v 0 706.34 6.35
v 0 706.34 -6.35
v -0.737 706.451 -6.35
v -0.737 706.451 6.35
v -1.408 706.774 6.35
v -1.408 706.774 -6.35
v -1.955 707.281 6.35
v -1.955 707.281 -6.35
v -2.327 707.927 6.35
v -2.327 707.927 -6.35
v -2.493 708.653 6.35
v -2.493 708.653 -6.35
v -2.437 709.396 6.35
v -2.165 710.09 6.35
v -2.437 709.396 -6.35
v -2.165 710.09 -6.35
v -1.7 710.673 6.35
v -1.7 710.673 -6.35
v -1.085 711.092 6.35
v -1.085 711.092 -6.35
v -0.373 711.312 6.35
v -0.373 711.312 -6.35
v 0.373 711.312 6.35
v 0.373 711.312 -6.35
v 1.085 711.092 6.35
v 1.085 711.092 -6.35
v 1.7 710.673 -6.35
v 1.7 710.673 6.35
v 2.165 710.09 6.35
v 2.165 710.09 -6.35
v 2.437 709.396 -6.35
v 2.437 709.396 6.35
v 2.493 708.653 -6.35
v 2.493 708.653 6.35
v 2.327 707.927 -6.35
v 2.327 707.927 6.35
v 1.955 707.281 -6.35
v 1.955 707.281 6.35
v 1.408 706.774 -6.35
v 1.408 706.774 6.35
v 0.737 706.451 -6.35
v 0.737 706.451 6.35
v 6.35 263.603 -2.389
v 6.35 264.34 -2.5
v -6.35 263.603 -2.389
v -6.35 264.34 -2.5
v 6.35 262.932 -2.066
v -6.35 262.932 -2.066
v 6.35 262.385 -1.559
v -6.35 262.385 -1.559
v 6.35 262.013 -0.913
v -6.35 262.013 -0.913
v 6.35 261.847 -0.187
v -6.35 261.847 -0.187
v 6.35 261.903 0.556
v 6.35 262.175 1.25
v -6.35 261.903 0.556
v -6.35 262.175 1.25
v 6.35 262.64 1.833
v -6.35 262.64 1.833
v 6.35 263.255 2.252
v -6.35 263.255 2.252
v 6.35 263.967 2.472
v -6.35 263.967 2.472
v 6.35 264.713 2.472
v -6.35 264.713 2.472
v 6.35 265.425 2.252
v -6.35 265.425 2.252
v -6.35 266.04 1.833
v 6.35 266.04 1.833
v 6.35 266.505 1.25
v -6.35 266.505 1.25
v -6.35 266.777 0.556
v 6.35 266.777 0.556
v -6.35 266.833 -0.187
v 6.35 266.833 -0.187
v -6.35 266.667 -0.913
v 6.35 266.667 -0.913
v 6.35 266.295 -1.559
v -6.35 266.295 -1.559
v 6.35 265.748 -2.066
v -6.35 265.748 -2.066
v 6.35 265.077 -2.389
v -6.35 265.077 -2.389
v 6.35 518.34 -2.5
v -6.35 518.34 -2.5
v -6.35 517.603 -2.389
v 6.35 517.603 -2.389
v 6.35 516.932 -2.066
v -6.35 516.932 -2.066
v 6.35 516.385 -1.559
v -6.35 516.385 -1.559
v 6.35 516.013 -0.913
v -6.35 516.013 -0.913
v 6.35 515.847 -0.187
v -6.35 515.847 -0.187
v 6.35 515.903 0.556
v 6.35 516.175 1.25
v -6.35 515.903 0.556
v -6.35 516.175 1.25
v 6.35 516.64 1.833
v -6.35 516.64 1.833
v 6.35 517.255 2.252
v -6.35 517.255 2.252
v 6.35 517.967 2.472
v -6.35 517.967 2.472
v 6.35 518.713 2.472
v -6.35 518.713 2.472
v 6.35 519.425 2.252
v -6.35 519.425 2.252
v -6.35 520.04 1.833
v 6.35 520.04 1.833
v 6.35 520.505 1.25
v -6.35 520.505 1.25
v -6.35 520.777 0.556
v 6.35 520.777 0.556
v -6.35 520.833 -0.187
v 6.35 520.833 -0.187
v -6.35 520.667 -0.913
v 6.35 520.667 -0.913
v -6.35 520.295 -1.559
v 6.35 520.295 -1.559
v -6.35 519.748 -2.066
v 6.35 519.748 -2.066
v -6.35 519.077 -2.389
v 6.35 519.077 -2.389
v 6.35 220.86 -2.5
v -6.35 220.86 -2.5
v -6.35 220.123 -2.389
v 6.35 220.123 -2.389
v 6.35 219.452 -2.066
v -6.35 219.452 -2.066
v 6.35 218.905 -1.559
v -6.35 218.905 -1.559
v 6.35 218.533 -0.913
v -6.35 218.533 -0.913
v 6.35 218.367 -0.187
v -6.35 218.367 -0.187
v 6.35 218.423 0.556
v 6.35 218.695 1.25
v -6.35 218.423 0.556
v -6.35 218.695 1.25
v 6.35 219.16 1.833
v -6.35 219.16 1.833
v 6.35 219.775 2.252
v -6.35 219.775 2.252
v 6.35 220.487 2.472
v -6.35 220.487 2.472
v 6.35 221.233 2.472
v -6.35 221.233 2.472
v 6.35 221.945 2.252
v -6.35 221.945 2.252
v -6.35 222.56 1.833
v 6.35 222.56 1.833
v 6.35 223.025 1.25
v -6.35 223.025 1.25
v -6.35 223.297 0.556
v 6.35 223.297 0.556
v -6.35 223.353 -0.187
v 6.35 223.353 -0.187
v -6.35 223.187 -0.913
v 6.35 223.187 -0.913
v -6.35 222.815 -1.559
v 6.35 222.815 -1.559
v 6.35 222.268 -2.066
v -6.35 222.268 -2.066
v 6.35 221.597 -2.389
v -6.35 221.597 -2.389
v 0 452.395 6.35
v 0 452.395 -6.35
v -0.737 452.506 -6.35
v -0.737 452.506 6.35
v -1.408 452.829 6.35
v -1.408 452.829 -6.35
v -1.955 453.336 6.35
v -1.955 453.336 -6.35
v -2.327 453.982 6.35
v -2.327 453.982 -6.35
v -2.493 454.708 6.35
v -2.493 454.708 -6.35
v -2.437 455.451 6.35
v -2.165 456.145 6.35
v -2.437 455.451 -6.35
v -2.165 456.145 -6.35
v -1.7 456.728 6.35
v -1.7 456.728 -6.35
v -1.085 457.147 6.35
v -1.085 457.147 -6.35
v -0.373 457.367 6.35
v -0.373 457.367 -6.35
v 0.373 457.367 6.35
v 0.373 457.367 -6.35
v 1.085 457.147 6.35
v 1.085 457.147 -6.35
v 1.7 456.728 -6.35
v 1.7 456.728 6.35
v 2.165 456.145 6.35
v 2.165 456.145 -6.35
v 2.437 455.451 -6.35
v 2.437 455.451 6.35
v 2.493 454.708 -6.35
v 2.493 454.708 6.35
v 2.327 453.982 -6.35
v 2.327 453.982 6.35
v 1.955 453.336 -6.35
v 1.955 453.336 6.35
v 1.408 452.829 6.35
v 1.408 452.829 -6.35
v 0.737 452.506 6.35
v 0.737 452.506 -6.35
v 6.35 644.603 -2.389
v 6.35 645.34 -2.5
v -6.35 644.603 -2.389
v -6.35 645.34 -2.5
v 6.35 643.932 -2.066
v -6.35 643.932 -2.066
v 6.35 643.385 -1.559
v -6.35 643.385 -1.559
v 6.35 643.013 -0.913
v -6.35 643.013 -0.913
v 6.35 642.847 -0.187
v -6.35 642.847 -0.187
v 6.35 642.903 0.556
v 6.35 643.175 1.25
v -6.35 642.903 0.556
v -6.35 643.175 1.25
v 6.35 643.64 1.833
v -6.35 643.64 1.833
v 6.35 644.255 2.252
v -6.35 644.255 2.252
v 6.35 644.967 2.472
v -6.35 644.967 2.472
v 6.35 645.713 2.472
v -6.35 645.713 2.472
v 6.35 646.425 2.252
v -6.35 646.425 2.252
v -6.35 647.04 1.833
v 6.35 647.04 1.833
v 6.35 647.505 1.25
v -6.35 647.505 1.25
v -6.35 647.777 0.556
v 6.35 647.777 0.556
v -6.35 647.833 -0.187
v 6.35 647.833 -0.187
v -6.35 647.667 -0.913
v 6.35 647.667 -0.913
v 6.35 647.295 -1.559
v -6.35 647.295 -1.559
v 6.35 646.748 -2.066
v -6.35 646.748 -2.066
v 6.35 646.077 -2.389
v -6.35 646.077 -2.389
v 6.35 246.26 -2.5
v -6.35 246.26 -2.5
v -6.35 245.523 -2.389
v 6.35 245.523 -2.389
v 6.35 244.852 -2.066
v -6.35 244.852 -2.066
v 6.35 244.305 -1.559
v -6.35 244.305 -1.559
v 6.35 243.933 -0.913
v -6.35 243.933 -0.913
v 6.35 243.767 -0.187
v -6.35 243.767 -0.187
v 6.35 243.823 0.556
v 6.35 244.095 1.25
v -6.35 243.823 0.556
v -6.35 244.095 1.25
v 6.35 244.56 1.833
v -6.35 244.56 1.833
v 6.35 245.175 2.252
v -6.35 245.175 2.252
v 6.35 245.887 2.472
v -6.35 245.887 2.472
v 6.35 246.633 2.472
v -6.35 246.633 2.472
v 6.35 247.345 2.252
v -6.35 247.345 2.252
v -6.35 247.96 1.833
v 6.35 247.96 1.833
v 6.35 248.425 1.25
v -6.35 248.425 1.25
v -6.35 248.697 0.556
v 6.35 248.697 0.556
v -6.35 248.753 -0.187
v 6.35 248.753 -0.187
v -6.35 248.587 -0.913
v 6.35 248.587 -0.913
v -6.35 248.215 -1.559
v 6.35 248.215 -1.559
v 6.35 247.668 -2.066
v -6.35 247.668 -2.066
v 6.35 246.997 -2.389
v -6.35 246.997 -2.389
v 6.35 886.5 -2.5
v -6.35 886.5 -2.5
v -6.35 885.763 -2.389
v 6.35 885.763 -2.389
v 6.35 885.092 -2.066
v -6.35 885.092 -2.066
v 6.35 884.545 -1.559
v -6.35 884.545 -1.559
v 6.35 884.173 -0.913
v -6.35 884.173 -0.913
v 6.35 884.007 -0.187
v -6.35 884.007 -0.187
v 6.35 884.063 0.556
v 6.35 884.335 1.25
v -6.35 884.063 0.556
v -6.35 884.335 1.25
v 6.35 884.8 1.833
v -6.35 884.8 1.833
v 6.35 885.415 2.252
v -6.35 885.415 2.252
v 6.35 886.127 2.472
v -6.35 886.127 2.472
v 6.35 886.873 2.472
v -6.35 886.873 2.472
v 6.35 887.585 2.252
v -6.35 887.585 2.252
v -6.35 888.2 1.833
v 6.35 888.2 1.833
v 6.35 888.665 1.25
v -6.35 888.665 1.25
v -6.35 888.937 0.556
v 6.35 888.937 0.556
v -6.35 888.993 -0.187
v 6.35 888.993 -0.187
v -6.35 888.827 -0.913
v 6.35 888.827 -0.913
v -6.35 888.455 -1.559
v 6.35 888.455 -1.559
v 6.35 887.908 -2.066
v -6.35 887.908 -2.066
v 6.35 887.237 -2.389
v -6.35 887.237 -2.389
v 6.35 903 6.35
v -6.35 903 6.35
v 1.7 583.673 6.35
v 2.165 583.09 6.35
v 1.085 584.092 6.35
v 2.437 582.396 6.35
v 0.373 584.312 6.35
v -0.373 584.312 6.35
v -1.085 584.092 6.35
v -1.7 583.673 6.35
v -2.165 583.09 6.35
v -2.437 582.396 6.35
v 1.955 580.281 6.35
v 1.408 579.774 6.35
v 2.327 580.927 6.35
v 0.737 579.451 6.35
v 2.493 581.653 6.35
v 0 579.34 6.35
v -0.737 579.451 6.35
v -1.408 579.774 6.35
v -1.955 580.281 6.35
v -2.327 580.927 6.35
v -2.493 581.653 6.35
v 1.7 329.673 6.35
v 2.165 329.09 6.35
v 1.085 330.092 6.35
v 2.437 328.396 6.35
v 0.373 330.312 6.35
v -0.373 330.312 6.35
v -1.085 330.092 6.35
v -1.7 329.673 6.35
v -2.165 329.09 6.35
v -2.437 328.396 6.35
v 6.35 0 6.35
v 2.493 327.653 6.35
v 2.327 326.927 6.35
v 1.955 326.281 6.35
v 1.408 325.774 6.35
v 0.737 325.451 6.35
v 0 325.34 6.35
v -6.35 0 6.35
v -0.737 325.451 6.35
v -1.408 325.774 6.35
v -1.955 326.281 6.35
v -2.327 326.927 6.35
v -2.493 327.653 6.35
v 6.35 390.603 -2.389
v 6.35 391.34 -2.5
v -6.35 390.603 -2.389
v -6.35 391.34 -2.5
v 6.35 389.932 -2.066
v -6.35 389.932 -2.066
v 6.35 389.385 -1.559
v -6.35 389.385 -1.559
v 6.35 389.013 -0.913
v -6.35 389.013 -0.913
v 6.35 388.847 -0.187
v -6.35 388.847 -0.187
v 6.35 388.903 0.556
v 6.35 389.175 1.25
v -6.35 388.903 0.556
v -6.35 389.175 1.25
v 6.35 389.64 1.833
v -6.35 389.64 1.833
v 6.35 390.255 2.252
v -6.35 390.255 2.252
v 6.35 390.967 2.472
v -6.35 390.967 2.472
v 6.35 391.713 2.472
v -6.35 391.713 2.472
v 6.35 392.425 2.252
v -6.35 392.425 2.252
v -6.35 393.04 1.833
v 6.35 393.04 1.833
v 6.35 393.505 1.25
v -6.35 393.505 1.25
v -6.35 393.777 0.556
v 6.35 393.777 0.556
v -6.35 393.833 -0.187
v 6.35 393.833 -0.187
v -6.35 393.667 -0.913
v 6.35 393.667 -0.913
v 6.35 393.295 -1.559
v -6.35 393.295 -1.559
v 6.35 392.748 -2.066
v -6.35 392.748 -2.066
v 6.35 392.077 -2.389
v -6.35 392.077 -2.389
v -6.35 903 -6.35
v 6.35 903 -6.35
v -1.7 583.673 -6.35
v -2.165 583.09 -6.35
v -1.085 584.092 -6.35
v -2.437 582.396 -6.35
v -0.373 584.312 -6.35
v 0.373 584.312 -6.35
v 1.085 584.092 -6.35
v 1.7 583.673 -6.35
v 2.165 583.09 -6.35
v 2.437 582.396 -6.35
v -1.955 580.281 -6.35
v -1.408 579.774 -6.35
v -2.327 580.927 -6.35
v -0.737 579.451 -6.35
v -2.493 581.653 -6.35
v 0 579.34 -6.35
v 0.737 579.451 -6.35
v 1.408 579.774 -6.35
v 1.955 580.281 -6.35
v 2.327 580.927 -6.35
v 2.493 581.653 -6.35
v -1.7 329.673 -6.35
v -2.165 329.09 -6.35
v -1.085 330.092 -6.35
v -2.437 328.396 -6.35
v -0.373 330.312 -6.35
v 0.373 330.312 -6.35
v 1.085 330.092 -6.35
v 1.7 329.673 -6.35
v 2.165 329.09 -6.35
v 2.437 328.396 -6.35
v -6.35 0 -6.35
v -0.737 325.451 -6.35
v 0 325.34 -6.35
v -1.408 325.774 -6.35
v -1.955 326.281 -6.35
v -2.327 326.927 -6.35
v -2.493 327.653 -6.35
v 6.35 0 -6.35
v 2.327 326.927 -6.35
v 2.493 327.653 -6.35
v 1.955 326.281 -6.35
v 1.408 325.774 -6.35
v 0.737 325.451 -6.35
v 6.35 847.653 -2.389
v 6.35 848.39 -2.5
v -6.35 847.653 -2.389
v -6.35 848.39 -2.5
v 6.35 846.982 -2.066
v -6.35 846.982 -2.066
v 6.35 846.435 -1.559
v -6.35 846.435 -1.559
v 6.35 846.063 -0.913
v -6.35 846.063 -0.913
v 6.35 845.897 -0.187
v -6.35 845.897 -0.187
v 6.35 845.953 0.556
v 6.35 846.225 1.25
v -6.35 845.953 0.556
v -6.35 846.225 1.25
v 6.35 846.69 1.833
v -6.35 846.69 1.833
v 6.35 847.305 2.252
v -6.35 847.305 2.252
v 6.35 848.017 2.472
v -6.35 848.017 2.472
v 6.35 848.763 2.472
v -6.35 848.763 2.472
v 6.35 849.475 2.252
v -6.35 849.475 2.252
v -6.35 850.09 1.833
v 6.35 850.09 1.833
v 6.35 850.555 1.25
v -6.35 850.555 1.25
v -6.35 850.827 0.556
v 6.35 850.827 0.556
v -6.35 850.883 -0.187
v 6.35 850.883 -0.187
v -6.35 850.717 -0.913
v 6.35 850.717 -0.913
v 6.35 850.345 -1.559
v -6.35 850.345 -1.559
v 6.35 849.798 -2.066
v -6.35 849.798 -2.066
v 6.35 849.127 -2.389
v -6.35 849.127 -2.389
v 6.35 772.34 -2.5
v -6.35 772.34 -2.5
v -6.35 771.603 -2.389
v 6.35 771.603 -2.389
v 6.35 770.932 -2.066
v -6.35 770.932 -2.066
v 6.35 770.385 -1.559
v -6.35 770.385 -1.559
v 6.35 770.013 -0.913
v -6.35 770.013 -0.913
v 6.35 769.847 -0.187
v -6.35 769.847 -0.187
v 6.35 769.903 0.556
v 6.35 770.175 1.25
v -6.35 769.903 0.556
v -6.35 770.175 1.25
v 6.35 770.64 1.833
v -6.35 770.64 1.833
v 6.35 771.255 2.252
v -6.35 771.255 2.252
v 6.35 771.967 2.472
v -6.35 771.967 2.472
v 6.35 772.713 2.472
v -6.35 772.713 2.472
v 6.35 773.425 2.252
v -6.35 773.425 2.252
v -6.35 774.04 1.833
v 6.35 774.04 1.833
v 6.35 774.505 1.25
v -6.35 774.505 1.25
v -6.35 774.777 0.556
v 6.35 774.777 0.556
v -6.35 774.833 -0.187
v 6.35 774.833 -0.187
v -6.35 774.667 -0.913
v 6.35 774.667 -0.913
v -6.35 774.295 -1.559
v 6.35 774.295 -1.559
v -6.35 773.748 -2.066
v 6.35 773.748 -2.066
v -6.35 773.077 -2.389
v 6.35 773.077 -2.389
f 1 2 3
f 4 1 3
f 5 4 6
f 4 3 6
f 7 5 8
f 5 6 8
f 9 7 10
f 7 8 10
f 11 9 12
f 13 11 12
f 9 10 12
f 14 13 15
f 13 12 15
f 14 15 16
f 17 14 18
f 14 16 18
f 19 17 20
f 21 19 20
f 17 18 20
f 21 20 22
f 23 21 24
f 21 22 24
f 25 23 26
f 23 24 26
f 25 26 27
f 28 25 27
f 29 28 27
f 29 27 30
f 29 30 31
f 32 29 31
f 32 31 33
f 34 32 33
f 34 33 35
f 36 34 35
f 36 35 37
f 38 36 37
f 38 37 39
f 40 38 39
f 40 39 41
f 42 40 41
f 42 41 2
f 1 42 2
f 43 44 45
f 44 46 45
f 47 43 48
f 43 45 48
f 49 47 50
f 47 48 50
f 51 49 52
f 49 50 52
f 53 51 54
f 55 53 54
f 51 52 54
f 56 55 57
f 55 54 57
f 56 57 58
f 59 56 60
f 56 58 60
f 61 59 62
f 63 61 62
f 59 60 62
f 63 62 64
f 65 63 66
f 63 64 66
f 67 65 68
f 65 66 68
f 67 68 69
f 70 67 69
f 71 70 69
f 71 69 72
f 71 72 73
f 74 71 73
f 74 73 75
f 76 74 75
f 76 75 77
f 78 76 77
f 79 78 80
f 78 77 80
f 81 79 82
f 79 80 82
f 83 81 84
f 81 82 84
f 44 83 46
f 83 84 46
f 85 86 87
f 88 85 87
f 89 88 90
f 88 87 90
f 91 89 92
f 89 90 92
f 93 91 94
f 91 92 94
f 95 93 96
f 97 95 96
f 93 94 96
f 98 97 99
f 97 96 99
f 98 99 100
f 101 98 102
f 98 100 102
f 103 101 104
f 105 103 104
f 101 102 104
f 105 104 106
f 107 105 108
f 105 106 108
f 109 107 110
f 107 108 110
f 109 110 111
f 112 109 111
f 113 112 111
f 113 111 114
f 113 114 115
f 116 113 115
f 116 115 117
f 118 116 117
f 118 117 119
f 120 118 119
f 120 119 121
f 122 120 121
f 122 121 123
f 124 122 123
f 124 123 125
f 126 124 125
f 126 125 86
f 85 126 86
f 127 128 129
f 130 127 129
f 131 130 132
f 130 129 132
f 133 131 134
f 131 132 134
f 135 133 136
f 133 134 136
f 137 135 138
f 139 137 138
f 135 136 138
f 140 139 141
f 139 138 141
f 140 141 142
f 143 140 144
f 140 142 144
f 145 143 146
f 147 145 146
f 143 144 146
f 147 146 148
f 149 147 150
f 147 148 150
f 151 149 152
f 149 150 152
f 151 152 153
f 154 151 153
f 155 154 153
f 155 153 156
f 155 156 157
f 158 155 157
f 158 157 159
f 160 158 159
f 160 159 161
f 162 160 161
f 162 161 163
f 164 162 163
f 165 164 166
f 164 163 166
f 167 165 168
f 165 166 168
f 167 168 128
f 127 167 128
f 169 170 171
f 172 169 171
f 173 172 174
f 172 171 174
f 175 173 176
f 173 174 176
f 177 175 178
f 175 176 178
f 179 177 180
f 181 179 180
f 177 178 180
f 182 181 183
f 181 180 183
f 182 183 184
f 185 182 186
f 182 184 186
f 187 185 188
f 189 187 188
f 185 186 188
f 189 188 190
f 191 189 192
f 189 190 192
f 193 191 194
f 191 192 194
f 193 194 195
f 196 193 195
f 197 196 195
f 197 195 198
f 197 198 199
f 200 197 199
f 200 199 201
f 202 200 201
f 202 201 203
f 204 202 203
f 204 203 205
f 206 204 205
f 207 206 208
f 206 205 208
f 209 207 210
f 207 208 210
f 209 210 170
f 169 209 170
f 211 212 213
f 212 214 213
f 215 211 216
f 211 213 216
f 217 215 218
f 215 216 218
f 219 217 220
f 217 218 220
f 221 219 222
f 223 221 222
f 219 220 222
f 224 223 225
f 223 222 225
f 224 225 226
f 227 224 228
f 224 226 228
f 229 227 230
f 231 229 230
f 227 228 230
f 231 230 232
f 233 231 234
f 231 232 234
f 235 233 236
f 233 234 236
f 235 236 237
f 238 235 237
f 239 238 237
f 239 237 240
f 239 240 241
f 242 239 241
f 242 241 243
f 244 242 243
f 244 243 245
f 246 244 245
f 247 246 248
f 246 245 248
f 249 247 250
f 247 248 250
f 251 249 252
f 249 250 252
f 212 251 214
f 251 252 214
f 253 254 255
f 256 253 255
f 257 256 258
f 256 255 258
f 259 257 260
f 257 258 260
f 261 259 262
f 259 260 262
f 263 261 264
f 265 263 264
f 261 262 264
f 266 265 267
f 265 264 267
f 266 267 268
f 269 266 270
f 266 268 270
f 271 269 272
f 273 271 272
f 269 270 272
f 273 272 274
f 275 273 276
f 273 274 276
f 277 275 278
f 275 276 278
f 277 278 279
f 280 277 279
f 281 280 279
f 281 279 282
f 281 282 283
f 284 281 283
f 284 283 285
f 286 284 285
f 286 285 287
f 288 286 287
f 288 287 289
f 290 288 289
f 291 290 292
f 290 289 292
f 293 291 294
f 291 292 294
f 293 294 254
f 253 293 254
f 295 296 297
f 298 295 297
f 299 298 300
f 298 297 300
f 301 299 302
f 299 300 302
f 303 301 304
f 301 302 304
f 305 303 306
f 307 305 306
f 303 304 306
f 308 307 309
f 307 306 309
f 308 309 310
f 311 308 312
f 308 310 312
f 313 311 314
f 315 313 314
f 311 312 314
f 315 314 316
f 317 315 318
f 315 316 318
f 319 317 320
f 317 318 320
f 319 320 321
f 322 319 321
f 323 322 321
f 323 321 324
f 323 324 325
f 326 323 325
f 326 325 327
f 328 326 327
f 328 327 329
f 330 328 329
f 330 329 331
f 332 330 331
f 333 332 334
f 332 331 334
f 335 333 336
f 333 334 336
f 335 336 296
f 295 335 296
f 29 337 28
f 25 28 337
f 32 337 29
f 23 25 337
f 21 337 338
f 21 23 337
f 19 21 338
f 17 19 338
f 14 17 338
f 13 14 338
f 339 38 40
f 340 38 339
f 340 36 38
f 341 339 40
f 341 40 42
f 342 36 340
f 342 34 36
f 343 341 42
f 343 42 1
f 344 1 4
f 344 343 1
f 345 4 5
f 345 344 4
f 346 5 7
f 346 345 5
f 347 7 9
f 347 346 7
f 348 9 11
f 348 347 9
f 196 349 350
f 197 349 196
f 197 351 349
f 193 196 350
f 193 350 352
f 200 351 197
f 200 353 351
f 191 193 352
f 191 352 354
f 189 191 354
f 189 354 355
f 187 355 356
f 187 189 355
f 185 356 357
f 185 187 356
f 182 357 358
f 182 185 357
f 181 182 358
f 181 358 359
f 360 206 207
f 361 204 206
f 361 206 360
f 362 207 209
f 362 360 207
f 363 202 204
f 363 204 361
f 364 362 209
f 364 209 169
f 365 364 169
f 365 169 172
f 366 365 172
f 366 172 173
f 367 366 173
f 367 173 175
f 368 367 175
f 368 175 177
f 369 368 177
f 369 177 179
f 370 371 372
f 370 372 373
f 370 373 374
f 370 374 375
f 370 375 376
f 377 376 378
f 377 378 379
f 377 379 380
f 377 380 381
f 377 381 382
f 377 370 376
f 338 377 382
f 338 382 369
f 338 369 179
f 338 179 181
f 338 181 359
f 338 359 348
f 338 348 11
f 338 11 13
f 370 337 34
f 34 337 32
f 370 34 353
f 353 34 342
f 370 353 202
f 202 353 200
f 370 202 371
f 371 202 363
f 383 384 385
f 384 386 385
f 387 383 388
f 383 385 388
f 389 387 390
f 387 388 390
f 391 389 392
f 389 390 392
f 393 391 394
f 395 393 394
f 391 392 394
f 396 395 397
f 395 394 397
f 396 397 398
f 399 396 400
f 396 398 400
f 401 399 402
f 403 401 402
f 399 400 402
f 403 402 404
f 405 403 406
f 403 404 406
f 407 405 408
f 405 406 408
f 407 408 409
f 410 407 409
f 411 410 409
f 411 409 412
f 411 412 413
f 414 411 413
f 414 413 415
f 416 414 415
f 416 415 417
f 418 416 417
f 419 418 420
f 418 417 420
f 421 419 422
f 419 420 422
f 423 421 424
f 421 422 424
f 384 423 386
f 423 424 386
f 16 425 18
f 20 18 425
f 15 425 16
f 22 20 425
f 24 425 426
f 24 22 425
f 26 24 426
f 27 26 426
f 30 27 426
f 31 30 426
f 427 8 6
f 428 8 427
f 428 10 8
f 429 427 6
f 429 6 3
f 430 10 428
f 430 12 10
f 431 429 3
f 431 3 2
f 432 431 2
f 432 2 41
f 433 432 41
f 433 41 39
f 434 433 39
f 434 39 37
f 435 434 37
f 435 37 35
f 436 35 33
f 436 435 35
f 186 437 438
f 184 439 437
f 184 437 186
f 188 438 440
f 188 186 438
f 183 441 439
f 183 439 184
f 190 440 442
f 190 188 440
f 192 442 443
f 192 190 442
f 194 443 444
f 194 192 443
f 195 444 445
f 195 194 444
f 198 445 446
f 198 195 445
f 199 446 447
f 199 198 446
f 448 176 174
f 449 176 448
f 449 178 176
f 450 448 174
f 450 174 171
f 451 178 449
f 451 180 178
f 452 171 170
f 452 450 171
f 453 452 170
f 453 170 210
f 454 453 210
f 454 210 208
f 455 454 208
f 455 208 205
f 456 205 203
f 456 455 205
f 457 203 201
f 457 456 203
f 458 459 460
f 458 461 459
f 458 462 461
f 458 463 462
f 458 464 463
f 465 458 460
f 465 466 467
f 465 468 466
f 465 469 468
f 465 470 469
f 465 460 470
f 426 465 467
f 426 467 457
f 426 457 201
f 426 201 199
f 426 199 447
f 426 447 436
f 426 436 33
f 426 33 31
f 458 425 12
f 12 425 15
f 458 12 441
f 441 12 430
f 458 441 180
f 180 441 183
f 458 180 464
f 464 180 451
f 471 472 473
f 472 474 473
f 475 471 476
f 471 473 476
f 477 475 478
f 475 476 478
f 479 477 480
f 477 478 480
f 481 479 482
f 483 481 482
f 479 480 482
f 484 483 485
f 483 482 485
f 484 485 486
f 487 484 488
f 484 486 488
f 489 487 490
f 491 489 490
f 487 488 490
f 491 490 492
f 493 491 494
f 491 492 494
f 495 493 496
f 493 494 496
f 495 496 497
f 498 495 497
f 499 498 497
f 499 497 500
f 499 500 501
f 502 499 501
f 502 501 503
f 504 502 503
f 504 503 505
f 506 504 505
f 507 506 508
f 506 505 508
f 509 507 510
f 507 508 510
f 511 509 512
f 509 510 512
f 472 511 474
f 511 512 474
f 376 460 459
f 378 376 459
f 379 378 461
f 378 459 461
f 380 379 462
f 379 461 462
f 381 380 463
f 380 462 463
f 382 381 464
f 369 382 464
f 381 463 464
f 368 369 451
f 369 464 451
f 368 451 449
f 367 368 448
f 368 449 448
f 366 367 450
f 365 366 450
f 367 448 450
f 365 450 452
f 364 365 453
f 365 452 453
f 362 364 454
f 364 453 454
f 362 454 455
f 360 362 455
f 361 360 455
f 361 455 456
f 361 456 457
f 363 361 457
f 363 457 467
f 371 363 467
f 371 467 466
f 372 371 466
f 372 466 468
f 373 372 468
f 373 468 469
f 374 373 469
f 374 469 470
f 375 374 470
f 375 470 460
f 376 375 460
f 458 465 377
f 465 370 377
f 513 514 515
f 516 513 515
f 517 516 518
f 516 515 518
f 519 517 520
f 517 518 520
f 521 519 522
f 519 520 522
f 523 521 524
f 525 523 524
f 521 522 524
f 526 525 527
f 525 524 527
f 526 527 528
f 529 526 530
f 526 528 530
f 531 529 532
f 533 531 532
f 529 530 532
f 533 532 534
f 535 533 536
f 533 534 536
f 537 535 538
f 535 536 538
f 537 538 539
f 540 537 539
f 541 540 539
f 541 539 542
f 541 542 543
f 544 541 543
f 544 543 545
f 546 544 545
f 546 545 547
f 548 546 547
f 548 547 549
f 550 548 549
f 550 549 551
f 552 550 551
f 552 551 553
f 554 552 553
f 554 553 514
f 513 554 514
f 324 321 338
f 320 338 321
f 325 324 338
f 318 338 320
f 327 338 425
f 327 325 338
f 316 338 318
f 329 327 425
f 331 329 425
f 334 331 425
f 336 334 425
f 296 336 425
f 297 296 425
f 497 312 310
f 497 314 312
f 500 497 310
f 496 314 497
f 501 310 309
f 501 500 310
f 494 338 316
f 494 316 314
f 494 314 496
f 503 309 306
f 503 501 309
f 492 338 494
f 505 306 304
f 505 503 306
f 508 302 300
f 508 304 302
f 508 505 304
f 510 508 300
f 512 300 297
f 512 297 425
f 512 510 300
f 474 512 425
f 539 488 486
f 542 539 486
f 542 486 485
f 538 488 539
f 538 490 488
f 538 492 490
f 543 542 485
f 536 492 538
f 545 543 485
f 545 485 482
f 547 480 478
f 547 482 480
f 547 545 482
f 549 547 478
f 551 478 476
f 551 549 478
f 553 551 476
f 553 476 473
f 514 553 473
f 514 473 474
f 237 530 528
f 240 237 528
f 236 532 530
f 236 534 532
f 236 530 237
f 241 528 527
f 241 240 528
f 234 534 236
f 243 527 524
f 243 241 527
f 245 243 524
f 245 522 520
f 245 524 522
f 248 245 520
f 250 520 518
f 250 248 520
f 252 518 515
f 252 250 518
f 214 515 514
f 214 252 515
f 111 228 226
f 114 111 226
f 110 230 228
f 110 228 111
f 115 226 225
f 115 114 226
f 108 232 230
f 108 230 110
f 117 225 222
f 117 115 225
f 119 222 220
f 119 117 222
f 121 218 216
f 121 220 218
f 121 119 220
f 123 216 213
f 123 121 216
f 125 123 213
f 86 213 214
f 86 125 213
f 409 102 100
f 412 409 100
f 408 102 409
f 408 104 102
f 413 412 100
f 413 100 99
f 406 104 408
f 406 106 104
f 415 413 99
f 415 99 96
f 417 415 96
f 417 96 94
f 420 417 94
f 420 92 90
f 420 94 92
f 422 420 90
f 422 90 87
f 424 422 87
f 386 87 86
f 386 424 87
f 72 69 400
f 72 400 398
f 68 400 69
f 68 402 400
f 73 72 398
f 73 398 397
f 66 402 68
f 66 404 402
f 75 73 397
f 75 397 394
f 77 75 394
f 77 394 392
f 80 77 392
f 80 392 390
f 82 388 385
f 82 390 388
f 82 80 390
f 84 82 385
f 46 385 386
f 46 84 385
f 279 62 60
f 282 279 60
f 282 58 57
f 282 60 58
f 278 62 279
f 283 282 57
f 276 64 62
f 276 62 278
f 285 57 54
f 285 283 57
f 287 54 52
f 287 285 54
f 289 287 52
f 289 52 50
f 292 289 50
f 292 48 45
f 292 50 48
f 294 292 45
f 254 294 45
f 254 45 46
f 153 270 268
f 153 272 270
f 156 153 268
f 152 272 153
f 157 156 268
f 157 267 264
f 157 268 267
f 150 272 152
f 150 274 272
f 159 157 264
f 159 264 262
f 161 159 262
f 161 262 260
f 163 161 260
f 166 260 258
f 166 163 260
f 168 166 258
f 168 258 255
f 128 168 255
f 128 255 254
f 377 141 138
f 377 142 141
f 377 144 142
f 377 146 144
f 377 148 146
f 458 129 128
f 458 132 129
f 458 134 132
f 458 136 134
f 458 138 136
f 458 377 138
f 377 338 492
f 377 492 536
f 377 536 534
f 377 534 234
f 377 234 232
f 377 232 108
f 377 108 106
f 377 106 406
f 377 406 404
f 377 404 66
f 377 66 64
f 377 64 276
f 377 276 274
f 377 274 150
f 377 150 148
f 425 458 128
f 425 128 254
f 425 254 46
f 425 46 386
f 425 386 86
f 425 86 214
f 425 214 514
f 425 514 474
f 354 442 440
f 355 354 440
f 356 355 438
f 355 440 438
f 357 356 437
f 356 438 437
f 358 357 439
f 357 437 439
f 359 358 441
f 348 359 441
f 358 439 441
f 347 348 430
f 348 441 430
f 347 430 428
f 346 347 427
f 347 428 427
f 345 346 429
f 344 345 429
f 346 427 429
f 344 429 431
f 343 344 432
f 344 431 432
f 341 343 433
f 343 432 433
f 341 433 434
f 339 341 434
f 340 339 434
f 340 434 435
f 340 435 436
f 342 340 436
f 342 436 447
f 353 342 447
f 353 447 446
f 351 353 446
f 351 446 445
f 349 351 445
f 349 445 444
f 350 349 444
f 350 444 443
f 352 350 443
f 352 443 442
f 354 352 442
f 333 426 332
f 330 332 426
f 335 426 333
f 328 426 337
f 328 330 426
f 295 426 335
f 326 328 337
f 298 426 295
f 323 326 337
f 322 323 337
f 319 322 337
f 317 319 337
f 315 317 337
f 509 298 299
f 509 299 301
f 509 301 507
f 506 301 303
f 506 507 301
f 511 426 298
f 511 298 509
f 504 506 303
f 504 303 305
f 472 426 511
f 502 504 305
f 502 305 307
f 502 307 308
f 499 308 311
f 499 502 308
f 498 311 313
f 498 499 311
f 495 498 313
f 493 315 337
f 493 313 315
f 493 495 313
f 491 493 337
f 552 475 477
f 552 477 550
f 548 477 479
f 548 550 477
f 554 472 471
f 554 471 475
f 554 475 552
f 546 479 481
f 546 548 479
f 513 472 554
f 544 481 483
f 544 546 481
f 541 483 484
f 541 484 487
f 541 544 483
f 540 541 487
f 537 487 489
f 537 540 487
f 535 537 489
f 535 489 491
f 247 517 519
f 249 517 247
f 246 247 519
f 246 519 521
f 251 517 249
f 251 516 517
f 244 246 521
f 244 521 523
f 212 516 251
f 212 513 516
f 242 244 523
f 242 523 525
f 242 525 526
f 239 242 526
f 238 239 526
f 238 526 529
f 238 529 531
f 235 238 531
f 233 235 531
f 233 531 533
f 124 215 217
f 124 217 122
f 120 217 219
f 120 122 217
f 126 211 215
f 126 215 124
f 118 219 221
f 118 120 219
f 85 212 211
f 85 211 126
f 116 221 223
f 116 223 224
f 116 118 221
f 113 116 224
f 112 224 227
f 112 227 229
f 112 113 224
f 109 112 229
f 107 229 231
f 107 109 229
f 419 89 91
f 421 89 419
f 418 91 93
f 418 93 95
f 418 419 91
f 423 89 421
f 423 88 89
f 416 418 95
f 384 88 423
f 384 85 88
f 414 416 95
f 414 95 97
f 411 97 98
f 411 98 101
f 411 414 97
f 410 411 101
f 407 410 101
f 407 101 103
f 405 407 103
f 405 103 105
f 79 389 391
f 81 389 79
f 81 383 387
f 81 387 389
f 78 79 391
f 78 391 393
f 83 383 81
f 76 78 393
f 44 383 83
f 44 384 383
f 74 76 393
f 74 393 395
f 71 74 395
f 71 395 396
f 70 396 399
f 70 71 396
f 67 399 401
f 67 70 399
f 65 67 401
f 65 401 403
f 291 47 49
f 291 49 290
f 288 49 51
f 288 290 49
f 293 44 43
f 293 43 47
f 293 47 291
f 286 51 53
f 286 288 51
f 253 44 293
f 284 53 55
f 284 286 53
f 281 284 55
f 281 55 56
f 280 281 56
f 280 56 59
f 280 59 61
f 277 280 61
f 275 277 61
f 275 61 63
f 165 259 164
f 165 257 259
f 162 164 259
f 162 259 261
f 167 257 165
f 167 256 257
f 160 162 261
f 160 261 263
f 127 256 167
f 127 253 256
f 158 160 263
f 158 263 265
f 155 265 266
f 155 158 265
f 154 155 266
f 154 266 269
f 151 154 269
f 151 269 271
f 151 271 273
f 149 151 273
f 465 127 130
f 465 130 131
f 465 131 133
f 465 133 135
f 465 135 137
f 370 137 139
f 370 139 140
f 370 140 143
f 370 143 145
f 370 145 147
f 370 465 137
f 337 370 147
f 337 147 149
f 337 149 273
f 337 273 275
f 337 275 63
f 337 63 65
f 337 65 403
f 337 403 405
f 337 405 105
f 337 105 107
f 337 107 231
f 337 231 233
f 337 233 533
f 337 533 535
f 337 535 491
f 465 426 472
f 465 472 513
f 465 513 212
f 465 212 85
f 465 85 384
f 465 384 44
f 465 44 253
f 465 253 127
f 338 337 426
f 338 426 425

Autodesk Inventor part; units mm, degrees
ref_plane "YZ Plane" through (0, 0, 0) normal (1, 0, 0) x (0, 1, 0)
ref_plane "XZ Plane" through (0, 0, 0) normal (0, 1, 0) x (-1, 0, 0)
ref_plane "XY Plane" through (0, 0, 0) normal (0, 0, 1) x (1, 0, 0)
sketch "Sketch1" plane through (0, 0, 0) normal (0, 1, 0) x (-1, 0, 0)
  line L0 (-6.35, 6.35) -> (6.35, 6.35)
  line L1 (6.35, 6.35) -> (6.35, -6.35)
  line L2 (6.35, -6.35) -> (-6.35, -6.35)
  line L3 (-6.35, -6.35) -> (-6.35, 6.35)
  line L4 (-6.35, 6.35) -> (6.35, -6.35) construction
  line L5 (6.35, 6.35) -> (-6.35, -6.35) construction
  point P0 (0, 0)
  dimension "d0" = 12.7
  dimension "d1" = 12.7
extrude "Extrusion1" add sketch "Sketch1" along normal blind 903
sketch "Sketch3" plane through (6.35, 0, -6.35) normal (1, 0, 0) x (0, 0, -1)
  circle A0 centre (-6.35, 886.5) radius 2.5
  line L0 (-12.7, 903) -> (0, 903) projected
  point P0 (-6.35, 0)
  dimension "d4" = 5
  dimension "d5" = 16.5
sketch "Sketch4" plane through (6.35, 0, -6.35) normal (1, 0, 0) x (0, 0, -1)
  circle A0 centre (-6.35, 848.39) radius 2.5
  line L0 (-12.7, 903) -> (0, 903) projected
  point P0 (-6.35, 0)
  dimension "d6" = 5
  dimension "d7" = 54.61
sketch "Sketch5" plane through (6.35, 0, -6.35) normal (1, 0, 0) x (0, 0, -1)
  circle A0 centre (-6.35, 772.34) radius 2.5
  line L0 (-12.7, 903) -> (0, 903) projected
  point P0 (-6.35, 0)
  dimension "d8" = 5
  dimension "d9" = 130.66
sketch "Sketch6" plane through (6.35, 0, -6.35) normal (1, 0, 0) x (0, 0, -1)
  circle A0 centre (-6.35, 645.34) radius 2.5
  line L0 (-12.7, 903) -> (0, 903) projected
  point P0 (-6.35, 0)
  dimension "d10" = 5
  dimension "d11" = 257.66
sketch "Sketch7" plane through (6.35, 0, -6.35) normal (1, 0, 0) x (0, 0, -1)
  circle A0 centre (-6.35, 518.34) radius 2.5
  line L0 (-12.7, 903) -> (0, 903) projected
  point P0 (-6.35, 0)
  dimension "d12" = 5
  dimension "d13" = 384.66
sketch "Sketch8" plane through (6.35, 0, -6.35) normal (1, 0, 0) x (0, 0, -1)
  circle A0 centre (-6.35, 391.34) radius 2.5
  line L0 (-12.7, 903) -> (0, 903) projected
  point P0 (-6.35, 0)
  dimension "d14" = 5
  dimension "d15" = 511.66
sketch "Sketch9" plane through (6.35, 0, -6.35) normal (1, 0, 0) x (0, 0, -1)
  circle A0 centre (-6.35, 264.34) radius 2.5
  line L0 (-12.7, 903) -> (0, 903) projected
  point P0 (-6.35, 0)
  dimension "d16" = 5
  dimension "d17" = 638.66
sketch "Sketch10" plane through (6.35, 0, -6.35) normal (1, 0, 0) x (0, 0, -1)
  circle A0 centre (-6.35, 246.26) radius 2.5
  line L0 (-12.7, 903) -> (0, 903) projected
  point P0 (-6.35, 0)
  dimension "d18" = 5
  dimension "d19" = 656.74
sketch "Sketch11" plane through (6.35, 0, -6.35) normal (1, 0, 0) x (0, 0, -1)
  circle A0 centre (-6.35, 220.86) radius 2.5
  line L0 (-12.7, 903) -> (0, 903) projected
  point P0 (-6.35, 0)
  dimension "d20" = 5
  dimension "d21" = 682.14
hole "Hole1" at (6.35, 886.5, 0) direction (-1, 0, 0) diameter 5 end through all
hole "Hole2" at (6.35, 848.39, 0) direction (-1, 0, 0) diameter 5 end through all
hole "Hole3" at (6.35, 772.34, 0) direction (-1, 0, 0) diameter 5 end through all
hole "Hole4" at (6.35, 645.34, 0) direction (-1, 0, 0) diameter 5 end through all
hole "Hole5" at (6.35, 518.34, 0) direction (-1, 0, 0) diameter 5 end through all
hole "Hole6" at (6.35, 391.34, 0) direction (-1, 0, 0) diameter 5 end through all
hole "Hole7" at (6.35, 264.34, 0) direction (-1, 0, 0) diameter 5 end through all
hole "Hole8" at (6.35, 246.26, 0) direction (-1, 0, 0) diameter 5 end through all
hole "Hole9" at (6.35, 220.86, 0) direction (-1, 0, 0) diameter 5 end through all
sketch "Sketch21" plane through (6.35, 0, 6.35) normal (0, 0, 1) x (1, 0, 0)
  circle A0 centre (-6.35, 708.84) radius 2.5
  line L0 (-12.7, 903) -> (0, 903) projected
  point P0 (-6.35, 0)
  dimension "d161" = 5
  dimension "d162" = 194.16
sketch "Sketch22" plane through (6.35, 0, 6.35) normal (0, 0, 1) x (1, 0, 0)
  circle A0 centre (-6.35, 581.84) radius 2.5
  line L0 (-12.7, 903) -> (0, 903) projected
  point P0 (-6.35, 0)
  dimension "d163" = 5
  dimension "d164" = 321.16
sketch "Sketch23" plane through (6.35, 0, 6.35) normal (0, 0, 1) x (1, 0, 0)
  circle A0 centre (-6.35, 454.895) radius 2.5
  line L0 (-12.7, 903) -> (0, 903) projected
  point P0 (-6.35, 0)
  dimension "d165" = 5
  dimension "d166" = 448.105
sketch "Sketch24" plane through (6.35, 0, 6.35) normal (0, 0, 1) x (1, 0, 0)
  circle A0 centre (-6.35, 327.84) radius 2.5
  line L0 (-12.7, 903) -> (0, 903) projected
  point P0 (-6.35, 0)
  dimension "d167" = 5
  dimension "d168" = 575.16
hole "Hole18" at (0, 708.84, 6.35) direction (0, 0, -1) diameter 5 end through all
hole "Hole19" at (0, 581.84, 6.35) direction (0, 0, -1) diameter 5 end through all
hole "Hole20" at (0, 454.895, 6.35) direction (0, 0, -1) diameter 5 end through all
hole "Hole21" at (0, 327.84, 6.35) direction (0, 0, -1) diameter 5 end through all
properties part number "Aluminium Rod"
